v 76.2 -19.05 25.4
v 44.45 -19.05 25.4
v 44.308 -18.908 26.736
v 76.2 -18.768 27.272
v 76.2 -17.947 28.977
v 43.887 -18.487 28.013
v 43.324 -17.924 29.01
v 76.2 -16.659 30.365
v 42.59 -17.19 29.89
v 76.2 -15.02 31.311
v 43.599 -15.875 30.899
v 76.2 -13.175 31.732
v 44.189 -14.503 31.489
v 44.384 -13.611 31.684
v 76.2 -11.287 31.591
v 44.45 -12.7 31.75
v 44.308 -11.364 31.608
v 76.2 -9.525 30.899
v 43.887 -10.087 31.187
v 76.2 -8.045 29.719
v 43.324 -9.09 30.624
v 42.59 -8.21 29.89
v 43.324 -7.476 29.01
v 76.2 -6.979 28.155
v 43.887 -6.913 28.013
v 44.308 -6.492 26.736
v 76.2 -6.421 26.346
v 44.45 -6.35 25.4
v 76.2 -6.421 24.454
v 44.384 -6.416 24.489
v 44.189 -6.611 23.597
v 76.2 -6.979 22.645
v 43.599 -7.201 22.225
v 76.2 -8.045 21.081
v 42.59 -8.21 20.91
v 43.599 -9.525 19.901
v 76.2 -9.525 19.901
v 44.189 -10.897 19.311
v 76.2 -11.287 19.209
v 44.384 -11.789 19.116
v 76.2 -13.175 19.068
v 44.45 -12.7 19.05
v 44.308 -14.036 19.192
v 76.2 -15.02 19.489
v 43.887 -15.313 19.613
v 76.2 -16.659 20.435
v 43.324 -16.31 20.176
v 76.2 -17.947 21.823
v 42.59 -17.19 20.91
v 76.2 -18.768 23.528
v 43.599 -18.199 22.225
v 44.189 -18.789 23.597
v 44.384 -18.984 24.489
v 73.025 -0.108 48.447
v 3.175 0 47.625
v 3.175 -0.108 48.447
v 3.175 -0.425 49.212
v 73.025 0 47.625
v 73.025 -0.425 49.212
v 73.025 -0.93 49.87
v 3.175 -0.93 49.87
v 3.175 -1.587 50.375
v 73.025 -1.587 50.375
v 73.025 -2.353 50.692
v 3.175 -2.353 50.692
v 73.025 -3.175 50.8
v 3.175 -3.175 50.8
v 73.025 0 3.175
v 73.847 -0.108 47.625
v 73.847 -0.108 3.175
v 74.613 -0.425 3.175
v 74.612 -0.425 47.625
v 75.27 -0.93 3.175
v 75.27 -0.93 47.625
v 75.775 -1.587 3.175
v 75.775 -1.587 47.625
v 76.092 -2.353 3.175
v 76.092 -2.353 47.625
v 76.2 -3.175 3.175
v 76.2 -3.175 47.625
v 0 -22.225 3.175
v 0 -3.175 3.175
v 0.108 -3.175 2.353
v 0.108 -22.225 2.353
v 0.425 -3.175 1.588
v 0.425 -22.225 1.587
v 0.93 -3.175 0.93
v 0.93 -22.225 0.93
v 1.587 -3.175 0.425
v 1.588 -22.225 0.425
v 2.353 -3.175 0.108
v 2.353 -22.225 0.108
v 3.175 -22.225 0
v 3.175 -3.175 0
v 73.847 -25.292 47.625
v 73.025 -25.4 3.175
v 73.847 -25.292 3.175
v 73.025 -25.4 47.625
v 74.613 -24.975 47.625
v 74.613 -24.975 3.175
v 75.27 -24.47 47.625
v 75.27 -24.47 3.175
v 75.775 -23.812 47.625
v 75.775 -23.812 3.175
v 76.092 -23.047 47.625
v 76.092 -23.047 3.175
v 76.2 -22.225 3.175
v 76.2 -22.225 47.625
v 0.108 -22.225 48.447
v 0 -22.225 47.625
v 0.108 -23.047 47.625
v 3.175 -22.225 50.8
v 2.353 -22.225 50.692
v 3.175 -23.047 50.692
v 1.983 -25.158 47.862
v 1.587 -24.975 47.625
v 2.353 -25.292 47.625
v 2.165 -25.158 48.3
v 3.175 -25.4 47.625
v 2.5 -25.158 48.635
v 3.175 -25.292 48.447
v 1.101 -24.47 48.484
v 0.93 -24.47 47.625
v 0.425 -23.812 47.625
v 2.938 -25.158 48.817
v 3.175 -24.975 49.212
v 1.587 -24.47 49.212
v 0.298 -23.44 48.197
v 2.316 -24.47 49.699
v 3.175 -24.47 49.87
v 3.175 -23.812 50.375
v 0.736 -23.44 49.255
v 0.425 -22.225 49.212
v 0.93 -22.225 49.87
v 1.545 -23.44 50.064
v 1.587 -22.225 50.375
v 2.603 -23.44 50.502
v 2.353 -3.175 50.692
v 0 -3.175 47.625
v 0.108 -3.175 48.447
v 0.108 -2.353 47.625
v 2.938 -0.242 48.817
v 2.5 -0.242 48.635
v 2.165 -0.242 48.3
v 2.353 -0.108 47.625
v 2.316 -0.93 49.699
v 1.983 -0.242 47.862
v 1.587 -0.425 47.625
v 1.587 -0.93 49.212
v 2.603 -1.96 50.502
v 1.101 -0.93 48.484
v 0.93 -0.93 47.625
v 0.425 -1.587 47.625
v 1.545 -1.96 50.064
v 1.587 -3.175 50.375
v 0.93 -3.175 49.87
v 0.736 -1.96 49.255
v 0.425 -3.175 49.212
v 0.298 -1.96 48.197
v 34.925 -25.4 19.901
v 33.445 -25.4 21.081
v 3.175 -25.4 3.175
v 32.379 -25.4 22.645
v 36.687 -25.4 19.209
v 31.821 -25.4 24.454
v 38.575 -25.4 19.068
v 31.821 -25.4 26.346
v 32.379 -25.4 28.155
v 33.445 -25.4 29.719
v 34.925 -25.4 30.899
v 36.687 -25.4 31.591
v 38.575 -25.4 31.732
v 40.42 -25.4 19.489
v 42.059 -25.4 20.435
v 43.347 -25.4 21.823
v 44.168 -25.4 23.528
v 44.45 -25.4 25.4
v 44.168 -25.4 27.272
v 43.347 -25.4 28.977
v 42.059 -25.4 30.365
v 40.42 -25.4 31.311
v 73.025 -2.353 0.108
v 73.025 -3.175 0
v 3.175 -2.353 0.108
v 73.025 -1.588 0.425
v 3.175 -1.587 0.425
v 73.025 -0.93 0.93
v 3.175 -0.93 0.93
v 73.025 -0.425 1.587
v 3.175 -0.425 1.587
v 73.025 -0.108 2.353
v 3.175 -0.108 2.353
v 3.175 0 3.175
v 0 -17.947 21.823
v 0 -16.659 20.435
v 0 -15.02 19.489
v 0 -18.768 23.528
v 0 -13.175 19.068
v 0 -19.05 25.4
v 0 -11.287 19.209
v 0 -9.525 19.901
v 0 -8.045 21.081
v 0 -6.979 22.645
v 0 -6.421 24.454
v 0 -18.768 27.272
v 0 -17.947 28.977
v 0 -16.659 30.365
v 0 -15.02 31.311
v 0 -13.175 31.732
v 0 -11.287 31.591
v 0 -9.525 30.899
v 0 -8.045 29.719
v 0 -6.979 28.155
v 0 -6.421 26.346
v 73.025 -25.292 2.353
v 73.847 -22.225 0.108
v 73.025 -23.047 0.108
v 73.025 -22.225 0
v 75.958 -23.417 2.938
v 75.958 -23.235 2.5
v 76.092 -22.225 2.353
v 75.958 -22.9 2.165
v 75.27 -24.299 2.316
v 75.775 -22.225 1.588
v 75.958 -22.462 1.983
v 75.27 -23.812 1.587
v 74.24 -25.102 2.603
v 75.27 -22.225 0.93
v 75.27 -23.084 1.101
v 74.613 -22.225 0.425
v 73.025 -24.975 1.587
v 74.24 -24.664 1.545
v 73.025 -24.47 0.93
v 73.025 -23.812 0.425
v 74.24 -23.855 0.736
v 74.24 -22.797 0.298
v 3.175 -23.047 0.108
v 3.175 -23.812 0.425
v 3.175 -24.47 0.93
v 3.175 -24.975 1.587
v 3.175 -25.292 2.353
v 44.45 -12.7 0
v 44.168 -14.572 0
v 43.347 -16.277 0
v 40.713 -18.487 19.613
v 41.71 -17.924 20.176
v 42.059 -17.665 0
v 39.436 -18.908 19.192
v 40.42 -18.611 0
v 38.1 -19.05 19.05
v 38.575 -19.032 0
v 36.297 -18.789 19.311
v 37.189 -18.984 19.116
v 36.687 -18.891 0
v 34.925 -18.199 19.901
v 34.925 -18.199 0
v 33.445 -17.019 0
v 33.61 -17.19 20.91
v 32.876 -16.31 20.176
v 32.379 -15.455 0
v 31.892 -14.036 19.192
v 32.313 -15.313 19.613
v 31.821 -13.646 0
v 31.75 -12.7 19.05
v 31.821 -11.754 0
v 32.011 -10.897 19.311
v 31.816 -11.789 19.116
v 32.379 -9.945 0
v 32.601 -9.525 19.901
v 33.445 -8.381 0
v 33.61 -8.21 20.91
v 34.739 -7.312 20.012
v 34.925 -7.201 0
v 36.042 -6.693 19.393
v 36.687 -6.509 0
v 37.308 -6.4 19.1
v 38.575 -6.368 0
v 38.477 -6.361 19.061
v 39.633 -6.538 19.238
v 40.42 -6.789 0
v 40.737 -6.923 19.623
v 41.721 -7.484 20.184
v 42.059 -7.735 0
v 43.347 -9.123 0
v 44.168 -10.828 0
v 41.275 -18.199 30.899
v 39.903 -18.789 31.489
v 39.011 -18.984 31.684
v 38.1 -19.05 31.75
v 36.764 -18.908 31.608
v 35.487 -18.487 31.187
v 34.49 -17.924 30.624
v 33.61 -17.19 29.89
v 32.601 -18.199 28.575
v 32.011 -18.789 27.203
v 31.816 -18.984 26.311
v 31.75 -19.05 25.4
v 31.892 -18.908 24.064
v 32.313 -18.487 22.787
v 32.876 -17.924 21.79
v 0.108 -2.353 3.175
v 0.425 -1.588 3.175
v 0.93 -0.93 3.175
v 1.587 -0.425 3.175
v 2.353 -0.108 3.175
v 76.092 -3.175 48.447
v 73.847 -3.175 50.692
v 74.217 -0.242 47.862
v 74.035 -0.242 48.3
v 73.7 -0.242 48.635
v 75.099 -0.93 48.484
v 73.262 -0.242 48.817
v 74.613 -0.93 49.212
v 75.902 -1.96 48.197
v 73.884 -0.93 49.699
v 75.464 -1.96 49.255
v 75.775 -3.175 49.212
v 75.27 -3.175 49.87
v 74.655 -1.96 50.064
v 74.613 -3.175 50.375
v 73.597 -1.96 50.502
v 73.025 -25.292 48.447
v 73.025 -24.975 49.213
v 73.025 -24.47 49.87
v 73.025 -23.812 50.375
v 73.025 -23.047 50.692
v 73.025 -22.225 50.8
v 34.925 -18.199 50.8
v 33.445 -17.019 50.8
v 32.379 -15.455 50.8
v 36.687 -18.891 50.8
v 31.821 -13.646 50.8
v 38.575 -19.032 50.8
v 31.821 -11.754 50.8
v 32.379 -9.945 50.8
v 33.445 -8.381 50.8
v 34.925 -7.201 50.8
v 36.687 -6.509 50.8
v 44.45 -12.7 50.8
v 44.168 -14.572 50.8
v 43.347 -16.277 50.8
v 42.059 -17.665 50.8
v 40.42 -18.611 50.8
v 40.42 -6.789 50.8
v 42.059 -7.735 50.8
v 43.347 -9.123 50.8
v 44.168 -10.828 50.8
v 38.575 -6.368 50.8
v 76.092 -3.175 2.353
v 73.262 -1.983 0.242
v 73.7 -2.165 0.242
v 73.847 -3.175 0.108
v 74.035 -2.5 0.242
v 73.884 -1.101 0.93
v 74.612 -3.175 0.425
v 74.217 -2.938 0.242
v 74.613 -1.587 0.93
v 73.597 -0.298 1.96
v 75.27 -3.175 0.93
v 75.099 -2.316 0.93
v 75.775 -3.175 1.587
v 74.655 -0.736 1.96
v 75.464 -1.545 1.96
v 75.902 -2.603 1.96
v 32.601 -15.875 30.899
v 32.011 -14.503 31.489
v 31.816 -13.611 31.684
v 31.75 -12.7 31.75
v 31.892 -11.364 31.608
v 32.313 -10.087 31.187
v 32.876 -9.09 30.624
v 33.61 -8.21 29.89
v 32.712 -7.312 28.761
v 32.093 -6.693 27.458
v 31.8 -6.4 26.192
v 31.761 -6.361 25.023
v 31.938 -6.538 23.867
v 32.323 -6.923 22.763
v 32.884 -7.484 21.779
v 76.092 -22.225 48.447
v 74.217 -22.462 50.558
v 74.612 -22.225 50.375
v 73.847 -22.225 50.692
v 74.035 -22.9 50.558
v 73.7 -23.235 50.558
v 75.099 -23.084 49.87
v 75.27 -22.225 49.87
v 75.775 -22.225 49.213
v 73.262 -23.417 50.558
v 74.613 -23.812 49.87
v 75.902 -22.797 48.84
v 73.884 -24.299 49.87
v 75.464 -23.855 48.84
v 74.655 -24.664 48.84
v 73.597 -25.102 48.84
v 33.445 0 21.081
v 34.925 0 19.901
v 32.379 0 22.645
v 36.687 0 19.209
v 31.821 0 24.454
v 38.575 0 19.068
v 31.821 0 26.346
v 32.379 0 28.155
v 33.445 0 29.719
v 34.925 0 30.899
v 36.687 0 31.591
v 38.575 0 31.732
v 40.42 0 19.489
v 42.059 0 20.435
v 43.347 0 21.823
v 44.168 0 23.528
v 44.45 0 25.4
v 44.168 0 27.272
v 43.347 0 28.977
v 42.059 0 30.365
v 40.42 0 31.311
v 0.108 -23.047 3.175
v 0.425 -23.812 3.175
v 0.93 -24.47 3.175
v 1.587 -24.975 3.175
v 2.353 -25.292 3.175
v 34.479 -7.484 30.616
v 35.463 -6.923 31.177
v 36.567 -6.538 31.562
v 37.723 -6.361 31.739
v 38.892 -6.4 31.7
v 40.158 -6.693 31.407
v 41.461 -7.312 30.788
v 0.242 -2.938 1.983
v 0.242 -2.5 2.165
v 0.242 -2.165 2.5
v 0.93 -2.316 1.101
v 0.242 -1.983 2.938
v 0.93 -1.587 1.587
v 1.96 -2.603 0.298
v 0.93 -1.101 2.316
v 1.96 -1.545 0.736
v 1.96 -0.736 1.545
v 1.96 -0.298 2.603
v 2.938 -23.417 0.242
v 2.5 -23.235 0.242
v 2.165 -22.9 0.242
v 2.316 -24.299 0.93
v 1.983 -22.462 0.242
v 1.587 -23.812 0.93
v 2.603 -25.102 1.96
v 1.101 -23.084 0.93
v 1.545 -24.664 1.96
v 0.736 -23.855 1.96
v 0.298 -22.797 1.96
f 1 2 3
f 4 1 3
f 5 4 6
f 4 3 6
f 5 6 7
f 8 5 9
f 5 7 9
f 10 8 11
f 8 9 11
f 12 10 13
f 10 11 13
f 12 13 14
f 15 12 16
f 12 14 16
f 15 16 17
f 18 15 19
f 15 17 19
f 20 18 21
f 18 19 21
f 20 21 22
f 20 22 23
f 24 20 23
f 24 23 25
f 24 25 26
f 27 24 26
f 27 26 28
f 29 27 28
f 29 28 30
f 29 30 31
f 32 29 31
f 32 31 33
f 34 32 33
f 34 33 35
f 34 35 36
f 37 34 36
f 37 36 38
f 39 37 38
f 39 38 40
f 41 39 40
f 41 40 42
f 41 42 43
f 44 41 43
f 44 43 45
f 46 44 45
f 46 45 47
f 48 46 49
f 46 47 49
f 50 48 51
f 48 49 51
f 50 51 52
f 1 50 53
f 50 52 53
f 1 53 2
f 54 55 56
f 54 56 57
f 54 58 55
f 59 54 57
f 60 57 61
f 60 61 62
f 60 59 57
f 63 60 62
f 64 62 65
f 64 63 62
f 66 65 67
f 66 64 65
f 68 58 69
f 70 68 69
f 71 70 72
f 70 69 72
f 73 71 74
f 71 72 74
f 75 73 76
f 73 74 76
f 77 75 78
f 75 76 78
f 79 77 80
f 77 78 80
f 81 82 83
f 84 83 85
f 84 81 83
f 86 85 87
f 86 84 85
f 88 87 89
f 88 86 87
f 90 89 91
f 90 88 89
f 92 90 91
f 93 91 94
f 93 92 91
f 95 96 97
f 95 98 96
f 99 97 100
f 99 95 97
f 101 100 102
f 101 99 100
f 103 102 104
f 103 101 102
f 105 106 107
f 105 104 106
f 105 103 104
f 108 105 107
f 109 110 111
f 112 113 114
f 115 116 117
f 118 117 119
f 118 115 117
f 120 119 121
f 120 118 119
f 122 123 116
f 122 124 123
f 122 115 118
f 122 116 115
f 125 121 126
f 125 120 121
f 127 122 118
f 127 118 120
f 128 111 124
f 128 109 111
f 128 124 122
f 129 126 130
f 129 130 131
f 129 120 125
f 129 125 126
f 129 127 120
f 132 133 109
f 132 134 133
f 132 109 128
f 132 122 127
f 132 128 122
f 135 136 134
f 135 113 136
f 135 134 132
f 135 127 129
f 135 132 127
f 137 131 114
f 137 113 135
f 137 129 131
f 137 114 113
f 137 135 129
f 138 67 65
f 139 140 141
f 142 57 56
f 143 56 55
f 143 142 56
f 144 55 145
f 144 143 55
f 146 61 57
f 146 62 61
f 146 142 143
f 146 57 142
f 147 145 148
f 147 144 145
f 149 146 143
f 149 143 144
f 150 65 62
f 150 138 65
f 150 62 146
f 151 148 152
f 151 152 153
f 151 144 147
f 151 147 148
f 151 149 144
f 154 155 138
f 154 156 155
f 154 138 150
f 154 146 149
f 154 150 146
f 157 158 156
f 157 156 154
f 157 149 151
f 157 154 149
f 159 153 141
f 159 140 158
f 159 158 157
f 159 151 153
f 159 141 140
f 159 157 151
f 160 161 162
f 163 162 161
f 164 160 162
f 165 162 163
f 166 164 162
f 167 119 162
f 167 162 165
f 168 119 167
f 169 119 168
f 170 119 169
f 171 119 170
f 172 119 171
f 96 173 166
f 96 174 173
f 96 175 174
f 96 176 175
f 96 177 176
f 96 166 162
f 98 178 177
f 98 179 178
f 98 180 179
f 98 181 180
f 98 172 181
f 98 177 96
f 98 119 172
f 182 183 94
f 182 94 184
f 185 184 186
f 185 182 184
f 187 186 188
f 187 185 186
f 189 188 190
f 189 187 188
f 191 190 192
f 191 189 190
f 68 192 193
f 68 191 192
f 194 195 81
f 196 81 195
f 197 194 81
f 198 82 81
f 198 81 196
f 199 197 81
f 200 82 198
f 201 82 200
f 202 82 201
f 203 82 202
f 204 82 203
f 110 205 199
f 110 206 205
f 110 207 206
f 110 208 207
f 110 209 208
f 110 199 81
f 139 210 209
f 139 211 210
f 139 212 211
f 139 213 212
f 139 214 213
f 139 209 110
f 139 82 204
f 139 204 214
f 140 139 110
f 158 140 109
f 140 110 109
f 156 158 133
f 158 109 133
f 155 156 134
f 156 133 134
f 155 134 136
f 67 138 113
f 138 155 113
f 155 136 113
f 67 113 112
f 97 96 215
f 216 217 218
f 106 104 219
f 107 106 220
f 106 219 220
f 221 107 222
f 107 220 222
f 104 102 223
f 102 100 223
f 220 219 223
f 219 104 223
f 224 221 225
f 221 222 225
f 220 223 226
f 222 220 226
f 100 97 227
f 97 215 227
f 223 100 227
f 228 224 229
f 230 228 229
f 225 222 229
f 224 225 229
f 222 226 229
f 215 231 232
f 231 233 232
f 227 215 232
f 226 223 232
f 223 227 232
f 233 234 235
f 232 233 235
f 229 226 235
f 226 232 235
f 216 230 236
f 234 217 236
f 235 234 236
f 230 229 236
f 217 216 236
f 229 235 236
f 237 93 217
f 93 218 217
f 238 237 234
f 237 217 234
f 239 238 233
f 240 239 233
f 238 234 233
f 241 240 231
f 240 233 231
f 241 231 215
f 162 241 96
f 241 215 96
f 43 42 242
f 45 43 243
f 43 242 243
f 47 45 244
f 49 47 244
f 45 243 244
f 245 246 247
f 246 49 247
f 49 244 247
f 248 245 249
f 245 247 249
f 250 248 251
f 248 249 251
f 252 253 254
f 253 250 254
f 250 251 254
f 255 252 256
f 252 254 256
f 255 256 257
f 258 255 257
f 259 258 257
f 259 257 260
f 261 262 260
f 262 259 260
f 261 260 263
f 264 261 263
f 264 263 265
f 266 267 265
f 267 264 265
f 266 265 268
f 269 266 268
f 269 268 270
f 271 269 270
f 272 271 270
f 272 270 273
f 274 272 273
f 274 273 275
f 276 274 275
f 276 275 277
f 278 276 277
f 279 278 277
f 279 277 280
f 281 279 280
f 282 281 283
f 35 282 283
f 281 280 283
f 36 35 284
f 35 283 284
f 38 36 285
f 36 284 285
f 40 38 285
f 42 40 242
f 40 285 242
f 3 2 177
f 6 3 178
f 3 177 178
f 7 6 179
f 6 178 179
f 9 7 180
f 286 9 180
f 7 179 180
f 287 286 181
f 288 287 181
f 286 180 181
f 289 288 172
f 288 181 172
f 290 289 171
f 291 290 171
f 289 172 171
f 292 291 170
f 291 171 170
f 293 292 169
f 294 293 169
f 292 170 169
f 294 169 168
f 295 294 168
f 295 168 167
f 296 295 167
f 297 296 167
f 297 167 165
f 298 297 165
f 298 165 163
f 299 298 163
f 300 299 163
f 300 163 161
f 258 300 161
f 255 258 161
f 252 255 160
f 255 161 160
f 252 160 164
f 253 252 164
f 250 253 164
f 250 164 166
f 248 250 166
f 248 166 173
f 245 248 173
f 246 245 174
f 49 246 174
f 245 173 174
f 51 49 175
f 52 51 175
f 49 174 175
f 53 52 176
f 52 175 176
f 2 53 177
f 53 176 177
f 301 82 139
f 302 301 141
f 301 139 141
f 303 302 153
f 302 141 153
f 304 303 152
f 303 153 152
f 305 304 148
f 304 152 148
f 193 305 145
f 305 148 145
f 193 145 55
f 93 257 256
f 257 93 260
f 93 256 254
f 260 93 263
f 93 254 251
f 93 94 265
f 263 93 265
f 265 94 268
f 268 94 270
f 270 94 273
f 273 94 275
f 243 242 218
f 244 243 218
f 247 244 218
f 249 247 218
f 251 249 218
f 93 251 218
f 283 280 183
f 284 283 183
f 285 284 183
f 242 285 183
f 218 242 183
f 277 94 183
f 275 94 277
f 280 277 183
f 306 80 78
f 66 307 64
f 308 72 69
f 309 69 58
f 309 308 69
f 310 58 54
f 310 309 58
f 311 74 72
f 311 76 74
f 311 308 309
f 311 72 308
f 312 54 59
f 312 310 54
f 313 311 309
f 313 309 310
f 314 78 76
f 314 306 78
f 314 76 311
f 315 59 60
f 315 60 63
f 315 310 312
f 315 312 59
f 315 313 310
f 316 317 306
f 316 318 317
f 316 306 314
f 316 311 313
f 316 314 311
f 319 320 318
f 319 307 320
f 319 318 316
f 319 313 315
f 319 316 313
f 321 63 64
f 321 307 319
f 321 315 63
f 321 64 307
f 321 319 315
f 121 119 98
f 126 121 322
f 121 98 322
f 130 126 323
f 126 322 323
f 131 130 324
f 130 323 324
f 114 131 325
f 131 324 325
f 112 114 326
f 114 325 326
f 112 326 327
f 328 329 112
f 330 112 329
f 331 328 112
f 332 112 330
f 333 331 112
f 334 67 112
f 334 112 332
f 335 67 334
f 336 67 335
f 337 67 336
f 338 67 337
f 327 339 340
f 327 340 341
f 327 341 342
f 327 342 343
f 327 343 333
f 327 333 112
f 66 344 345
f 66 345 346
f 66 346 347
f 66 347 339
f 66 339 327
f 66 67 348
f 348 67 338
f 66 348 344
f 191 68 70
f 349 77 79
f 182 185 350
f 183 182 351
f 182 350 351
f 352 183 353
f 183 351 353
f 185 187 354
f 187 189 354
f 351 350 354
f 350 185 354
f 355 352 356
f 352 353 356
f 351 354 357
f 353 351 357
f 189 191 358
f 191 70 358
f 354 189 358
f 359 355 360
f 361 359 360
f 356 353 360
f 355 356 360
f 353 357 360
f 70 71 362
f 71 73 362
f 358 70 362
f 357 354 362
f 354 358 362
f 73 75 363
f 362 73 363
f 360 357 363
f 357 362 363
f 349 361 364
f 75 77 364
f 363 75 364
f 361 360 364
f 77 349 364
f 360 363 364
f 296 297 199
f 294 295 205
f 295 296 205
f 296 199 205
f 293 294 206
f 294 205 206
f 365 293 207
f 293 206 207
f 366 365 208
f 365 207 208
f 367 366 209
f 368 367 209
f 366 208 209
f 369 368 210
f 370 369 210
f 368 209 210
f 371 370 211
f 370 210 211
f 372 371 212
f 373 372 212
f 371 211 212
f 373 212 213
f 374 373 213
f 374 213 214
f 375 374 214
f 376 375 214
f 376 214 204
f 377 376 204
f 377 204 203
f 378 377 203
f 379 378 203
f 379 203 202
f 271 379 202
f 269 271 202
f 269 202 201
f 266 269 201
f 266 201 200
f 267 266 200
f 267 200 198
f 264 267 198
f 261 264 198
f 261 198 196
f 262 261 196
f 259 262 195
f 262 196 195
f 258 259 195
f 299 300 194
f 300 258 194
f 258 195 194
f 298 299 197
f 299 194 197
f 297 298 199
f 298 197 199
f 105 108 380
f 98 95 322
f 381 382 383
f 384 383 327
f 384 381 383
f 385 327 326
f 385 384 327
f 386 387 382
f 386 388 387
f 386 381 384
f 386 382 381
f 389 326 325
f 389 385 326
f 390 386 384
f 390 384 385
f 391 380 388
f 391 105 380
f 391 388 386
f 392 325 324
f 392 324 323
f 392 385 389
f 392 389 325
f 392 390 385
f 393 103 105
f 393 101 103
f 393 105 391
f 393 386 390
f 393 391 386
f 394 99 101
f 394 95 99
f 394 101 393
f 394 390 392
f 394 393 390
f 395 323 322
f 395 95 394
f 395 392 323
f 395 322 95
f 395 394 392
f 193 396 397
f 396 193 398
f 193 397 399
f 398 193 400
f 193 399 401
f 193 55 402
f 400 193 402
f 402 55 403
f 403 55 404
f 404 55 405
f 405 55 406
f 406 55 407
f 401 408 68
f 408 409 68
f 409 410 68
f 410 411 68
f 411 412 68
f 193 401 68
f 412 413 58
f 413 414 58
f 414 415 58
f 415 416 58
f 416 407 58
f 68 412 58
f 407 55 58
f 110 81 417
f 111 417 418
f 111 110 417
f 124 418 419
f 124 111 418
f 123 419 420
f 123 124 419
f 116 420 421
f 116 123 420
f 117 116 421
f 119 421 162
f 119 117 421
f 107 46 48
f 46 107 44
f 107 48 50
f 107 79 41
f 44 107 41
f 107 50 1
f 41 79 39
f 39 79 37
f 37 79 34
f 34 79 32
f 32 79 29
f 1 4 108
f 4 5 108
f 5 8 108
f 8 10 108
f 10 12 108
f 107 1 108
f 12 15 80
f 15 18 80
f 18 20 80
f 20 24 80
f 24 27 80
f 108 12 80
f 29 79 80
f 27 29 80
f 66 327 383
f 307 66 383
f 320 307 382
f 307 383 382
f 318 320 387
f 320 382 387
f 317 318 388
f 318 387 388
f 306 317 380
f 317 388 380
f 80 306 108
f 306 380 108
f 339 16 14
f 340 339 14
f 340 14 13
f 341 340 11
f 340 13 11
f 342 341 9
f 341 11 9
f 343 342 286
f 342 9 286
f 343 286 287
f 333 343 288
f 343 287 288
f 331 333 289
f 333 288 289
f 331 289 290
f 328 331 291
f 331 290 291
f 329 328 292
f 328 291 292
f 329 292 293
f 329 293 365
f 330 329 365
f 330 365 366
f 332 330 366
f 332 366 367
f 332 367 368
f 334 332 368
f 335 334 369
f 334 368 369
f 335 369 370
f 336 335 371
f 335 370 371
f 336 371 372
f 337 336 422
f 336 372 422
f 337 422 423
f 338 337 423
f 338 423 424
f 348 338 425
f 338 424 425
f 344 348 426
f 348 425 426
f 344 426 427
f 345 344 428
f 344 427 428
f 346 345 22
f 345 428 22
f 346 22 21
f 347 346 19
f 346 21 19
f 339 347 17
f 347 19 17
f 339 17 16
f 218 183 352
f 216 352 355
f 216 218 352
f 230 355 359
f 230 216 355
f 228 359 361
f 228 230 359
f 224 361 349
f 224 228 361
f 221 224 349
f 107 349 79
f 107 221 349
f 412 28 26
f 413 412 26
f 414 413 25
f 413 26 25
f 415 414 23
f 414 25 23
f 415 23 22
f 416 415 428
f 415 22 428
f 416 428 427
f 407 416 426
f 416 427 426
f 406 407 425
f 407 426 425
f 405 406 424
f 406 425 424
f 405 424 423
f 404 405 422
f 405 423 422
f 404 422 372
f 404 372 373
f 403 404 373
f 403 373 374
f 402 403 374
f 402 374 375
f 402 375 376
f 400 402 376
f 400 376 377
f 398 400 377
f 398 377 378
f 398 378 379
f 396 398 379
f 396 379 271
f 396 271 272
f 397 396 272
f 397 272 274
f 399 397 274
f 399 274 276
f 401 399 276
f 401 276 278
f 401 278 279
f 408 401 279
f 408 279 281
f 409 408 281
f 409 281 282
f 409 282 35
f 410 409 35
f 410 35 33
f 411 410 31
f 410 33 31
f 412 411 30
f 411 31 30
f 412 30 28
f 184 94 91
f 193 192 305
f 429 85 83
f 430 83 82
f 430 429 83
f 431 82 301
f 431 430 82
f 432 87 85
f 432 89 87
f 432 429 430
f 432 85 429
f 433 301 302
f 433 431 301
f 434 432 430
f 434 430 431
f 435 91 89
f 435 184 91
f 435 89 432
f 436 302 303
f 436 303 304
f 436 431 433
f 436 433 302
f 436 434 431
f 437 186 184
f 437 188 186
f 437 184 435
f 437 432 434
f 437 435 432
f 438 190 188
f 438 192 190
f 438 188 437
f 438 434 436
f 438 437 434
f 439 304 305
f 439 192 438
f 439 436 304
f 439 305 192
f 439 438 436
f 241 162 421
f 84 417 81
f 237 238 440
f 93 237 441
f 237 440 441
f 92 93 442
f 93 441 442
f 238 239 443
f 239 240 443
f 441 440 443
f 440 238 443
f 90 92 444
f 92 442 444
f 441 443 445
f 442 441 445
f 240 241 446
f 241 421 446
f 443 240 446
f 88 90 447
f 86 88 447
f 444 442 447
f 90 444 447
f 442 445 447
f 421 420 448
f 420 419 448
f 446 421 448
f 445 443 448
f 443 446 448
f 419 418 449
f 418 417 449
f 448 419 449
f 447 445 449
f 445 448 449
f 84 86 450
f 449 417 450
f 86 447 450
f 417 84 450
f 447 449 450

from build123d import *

# Parameters (mm, degrees)
F0_W     = 76.2
F0_H     = 50.8
F1_DEPTH = 25.4
F2_R     = 6.35
F3_DEPTH = 25.401
F4_R     = 6.35
F5_DEPTH = 76.201
F6_R     = 6.35
F7_DEPTH = 50.801
F8_R     = 3.175


with BuildPart() as f1:
    # F0 (on Front) → F1 (new body)
    with BuildSketch(Plane.XZ):
        with Locations((38.1, 25.4)):
            Rectangle(F0_W, F0_H)
    extrude(amount=F1_DEPTH)

    # F2 (on face) → F3 (cut, through all)
    with BuildSketch(Plane.XZ.offset(25.4)):
        with Locations((38.1, 25.4)):
            Circle(F2_R)
    extrude(amount=-F3_DEPTH, mode=Mode.SUBTRACT)

    # F4 (on face) → F5 (cut, through all)
    with BuildSketch(Plane(origin=(0, 0, 0), x_dir=(0, -1, 0), z_dir=(-1, 0, 0))):
        with Locations((12.7, 25.4)):
            Circle(F4_R)
    extrude(amount=-F5_DEPTH, mode=Mode.SUBTRACT)

    # F6 (on face) → F7 (cut, through all)
    with BuildSketch(Plane(origin=(0, 0, 0), x_dir=(1, 0, 0), z_dir=(0, 0, -1))):
        with Locations((38.1, 12.7)):
            Circle(F6_R)
    extrude(amount=-F7_DEPTH, mode=Mode.SUBTRACT)

    # F8
    f8_edges = [f1.edges().sort_by_distance(p)[0] for p in [
        (0, -12.7, 50.8),
        (0, -25.4, 25.4),
        (38.1, -25.4, 0),
        (76.2, -25.4, 25.4),
        (76.2, -12.7, 50.8),
        (76.2, 0, 25.4),
        (38.1, -25.4, 50.8),
        (38.1, 0, 50.8),
        (38.1, 0, 0),
        (0, -12.7, 0),
        (0, 0, 25.4),
        (76.2, -12.7, 0),
    ]]
    fillet(f8_edges, radius=F8_R)


solid = f1.part
